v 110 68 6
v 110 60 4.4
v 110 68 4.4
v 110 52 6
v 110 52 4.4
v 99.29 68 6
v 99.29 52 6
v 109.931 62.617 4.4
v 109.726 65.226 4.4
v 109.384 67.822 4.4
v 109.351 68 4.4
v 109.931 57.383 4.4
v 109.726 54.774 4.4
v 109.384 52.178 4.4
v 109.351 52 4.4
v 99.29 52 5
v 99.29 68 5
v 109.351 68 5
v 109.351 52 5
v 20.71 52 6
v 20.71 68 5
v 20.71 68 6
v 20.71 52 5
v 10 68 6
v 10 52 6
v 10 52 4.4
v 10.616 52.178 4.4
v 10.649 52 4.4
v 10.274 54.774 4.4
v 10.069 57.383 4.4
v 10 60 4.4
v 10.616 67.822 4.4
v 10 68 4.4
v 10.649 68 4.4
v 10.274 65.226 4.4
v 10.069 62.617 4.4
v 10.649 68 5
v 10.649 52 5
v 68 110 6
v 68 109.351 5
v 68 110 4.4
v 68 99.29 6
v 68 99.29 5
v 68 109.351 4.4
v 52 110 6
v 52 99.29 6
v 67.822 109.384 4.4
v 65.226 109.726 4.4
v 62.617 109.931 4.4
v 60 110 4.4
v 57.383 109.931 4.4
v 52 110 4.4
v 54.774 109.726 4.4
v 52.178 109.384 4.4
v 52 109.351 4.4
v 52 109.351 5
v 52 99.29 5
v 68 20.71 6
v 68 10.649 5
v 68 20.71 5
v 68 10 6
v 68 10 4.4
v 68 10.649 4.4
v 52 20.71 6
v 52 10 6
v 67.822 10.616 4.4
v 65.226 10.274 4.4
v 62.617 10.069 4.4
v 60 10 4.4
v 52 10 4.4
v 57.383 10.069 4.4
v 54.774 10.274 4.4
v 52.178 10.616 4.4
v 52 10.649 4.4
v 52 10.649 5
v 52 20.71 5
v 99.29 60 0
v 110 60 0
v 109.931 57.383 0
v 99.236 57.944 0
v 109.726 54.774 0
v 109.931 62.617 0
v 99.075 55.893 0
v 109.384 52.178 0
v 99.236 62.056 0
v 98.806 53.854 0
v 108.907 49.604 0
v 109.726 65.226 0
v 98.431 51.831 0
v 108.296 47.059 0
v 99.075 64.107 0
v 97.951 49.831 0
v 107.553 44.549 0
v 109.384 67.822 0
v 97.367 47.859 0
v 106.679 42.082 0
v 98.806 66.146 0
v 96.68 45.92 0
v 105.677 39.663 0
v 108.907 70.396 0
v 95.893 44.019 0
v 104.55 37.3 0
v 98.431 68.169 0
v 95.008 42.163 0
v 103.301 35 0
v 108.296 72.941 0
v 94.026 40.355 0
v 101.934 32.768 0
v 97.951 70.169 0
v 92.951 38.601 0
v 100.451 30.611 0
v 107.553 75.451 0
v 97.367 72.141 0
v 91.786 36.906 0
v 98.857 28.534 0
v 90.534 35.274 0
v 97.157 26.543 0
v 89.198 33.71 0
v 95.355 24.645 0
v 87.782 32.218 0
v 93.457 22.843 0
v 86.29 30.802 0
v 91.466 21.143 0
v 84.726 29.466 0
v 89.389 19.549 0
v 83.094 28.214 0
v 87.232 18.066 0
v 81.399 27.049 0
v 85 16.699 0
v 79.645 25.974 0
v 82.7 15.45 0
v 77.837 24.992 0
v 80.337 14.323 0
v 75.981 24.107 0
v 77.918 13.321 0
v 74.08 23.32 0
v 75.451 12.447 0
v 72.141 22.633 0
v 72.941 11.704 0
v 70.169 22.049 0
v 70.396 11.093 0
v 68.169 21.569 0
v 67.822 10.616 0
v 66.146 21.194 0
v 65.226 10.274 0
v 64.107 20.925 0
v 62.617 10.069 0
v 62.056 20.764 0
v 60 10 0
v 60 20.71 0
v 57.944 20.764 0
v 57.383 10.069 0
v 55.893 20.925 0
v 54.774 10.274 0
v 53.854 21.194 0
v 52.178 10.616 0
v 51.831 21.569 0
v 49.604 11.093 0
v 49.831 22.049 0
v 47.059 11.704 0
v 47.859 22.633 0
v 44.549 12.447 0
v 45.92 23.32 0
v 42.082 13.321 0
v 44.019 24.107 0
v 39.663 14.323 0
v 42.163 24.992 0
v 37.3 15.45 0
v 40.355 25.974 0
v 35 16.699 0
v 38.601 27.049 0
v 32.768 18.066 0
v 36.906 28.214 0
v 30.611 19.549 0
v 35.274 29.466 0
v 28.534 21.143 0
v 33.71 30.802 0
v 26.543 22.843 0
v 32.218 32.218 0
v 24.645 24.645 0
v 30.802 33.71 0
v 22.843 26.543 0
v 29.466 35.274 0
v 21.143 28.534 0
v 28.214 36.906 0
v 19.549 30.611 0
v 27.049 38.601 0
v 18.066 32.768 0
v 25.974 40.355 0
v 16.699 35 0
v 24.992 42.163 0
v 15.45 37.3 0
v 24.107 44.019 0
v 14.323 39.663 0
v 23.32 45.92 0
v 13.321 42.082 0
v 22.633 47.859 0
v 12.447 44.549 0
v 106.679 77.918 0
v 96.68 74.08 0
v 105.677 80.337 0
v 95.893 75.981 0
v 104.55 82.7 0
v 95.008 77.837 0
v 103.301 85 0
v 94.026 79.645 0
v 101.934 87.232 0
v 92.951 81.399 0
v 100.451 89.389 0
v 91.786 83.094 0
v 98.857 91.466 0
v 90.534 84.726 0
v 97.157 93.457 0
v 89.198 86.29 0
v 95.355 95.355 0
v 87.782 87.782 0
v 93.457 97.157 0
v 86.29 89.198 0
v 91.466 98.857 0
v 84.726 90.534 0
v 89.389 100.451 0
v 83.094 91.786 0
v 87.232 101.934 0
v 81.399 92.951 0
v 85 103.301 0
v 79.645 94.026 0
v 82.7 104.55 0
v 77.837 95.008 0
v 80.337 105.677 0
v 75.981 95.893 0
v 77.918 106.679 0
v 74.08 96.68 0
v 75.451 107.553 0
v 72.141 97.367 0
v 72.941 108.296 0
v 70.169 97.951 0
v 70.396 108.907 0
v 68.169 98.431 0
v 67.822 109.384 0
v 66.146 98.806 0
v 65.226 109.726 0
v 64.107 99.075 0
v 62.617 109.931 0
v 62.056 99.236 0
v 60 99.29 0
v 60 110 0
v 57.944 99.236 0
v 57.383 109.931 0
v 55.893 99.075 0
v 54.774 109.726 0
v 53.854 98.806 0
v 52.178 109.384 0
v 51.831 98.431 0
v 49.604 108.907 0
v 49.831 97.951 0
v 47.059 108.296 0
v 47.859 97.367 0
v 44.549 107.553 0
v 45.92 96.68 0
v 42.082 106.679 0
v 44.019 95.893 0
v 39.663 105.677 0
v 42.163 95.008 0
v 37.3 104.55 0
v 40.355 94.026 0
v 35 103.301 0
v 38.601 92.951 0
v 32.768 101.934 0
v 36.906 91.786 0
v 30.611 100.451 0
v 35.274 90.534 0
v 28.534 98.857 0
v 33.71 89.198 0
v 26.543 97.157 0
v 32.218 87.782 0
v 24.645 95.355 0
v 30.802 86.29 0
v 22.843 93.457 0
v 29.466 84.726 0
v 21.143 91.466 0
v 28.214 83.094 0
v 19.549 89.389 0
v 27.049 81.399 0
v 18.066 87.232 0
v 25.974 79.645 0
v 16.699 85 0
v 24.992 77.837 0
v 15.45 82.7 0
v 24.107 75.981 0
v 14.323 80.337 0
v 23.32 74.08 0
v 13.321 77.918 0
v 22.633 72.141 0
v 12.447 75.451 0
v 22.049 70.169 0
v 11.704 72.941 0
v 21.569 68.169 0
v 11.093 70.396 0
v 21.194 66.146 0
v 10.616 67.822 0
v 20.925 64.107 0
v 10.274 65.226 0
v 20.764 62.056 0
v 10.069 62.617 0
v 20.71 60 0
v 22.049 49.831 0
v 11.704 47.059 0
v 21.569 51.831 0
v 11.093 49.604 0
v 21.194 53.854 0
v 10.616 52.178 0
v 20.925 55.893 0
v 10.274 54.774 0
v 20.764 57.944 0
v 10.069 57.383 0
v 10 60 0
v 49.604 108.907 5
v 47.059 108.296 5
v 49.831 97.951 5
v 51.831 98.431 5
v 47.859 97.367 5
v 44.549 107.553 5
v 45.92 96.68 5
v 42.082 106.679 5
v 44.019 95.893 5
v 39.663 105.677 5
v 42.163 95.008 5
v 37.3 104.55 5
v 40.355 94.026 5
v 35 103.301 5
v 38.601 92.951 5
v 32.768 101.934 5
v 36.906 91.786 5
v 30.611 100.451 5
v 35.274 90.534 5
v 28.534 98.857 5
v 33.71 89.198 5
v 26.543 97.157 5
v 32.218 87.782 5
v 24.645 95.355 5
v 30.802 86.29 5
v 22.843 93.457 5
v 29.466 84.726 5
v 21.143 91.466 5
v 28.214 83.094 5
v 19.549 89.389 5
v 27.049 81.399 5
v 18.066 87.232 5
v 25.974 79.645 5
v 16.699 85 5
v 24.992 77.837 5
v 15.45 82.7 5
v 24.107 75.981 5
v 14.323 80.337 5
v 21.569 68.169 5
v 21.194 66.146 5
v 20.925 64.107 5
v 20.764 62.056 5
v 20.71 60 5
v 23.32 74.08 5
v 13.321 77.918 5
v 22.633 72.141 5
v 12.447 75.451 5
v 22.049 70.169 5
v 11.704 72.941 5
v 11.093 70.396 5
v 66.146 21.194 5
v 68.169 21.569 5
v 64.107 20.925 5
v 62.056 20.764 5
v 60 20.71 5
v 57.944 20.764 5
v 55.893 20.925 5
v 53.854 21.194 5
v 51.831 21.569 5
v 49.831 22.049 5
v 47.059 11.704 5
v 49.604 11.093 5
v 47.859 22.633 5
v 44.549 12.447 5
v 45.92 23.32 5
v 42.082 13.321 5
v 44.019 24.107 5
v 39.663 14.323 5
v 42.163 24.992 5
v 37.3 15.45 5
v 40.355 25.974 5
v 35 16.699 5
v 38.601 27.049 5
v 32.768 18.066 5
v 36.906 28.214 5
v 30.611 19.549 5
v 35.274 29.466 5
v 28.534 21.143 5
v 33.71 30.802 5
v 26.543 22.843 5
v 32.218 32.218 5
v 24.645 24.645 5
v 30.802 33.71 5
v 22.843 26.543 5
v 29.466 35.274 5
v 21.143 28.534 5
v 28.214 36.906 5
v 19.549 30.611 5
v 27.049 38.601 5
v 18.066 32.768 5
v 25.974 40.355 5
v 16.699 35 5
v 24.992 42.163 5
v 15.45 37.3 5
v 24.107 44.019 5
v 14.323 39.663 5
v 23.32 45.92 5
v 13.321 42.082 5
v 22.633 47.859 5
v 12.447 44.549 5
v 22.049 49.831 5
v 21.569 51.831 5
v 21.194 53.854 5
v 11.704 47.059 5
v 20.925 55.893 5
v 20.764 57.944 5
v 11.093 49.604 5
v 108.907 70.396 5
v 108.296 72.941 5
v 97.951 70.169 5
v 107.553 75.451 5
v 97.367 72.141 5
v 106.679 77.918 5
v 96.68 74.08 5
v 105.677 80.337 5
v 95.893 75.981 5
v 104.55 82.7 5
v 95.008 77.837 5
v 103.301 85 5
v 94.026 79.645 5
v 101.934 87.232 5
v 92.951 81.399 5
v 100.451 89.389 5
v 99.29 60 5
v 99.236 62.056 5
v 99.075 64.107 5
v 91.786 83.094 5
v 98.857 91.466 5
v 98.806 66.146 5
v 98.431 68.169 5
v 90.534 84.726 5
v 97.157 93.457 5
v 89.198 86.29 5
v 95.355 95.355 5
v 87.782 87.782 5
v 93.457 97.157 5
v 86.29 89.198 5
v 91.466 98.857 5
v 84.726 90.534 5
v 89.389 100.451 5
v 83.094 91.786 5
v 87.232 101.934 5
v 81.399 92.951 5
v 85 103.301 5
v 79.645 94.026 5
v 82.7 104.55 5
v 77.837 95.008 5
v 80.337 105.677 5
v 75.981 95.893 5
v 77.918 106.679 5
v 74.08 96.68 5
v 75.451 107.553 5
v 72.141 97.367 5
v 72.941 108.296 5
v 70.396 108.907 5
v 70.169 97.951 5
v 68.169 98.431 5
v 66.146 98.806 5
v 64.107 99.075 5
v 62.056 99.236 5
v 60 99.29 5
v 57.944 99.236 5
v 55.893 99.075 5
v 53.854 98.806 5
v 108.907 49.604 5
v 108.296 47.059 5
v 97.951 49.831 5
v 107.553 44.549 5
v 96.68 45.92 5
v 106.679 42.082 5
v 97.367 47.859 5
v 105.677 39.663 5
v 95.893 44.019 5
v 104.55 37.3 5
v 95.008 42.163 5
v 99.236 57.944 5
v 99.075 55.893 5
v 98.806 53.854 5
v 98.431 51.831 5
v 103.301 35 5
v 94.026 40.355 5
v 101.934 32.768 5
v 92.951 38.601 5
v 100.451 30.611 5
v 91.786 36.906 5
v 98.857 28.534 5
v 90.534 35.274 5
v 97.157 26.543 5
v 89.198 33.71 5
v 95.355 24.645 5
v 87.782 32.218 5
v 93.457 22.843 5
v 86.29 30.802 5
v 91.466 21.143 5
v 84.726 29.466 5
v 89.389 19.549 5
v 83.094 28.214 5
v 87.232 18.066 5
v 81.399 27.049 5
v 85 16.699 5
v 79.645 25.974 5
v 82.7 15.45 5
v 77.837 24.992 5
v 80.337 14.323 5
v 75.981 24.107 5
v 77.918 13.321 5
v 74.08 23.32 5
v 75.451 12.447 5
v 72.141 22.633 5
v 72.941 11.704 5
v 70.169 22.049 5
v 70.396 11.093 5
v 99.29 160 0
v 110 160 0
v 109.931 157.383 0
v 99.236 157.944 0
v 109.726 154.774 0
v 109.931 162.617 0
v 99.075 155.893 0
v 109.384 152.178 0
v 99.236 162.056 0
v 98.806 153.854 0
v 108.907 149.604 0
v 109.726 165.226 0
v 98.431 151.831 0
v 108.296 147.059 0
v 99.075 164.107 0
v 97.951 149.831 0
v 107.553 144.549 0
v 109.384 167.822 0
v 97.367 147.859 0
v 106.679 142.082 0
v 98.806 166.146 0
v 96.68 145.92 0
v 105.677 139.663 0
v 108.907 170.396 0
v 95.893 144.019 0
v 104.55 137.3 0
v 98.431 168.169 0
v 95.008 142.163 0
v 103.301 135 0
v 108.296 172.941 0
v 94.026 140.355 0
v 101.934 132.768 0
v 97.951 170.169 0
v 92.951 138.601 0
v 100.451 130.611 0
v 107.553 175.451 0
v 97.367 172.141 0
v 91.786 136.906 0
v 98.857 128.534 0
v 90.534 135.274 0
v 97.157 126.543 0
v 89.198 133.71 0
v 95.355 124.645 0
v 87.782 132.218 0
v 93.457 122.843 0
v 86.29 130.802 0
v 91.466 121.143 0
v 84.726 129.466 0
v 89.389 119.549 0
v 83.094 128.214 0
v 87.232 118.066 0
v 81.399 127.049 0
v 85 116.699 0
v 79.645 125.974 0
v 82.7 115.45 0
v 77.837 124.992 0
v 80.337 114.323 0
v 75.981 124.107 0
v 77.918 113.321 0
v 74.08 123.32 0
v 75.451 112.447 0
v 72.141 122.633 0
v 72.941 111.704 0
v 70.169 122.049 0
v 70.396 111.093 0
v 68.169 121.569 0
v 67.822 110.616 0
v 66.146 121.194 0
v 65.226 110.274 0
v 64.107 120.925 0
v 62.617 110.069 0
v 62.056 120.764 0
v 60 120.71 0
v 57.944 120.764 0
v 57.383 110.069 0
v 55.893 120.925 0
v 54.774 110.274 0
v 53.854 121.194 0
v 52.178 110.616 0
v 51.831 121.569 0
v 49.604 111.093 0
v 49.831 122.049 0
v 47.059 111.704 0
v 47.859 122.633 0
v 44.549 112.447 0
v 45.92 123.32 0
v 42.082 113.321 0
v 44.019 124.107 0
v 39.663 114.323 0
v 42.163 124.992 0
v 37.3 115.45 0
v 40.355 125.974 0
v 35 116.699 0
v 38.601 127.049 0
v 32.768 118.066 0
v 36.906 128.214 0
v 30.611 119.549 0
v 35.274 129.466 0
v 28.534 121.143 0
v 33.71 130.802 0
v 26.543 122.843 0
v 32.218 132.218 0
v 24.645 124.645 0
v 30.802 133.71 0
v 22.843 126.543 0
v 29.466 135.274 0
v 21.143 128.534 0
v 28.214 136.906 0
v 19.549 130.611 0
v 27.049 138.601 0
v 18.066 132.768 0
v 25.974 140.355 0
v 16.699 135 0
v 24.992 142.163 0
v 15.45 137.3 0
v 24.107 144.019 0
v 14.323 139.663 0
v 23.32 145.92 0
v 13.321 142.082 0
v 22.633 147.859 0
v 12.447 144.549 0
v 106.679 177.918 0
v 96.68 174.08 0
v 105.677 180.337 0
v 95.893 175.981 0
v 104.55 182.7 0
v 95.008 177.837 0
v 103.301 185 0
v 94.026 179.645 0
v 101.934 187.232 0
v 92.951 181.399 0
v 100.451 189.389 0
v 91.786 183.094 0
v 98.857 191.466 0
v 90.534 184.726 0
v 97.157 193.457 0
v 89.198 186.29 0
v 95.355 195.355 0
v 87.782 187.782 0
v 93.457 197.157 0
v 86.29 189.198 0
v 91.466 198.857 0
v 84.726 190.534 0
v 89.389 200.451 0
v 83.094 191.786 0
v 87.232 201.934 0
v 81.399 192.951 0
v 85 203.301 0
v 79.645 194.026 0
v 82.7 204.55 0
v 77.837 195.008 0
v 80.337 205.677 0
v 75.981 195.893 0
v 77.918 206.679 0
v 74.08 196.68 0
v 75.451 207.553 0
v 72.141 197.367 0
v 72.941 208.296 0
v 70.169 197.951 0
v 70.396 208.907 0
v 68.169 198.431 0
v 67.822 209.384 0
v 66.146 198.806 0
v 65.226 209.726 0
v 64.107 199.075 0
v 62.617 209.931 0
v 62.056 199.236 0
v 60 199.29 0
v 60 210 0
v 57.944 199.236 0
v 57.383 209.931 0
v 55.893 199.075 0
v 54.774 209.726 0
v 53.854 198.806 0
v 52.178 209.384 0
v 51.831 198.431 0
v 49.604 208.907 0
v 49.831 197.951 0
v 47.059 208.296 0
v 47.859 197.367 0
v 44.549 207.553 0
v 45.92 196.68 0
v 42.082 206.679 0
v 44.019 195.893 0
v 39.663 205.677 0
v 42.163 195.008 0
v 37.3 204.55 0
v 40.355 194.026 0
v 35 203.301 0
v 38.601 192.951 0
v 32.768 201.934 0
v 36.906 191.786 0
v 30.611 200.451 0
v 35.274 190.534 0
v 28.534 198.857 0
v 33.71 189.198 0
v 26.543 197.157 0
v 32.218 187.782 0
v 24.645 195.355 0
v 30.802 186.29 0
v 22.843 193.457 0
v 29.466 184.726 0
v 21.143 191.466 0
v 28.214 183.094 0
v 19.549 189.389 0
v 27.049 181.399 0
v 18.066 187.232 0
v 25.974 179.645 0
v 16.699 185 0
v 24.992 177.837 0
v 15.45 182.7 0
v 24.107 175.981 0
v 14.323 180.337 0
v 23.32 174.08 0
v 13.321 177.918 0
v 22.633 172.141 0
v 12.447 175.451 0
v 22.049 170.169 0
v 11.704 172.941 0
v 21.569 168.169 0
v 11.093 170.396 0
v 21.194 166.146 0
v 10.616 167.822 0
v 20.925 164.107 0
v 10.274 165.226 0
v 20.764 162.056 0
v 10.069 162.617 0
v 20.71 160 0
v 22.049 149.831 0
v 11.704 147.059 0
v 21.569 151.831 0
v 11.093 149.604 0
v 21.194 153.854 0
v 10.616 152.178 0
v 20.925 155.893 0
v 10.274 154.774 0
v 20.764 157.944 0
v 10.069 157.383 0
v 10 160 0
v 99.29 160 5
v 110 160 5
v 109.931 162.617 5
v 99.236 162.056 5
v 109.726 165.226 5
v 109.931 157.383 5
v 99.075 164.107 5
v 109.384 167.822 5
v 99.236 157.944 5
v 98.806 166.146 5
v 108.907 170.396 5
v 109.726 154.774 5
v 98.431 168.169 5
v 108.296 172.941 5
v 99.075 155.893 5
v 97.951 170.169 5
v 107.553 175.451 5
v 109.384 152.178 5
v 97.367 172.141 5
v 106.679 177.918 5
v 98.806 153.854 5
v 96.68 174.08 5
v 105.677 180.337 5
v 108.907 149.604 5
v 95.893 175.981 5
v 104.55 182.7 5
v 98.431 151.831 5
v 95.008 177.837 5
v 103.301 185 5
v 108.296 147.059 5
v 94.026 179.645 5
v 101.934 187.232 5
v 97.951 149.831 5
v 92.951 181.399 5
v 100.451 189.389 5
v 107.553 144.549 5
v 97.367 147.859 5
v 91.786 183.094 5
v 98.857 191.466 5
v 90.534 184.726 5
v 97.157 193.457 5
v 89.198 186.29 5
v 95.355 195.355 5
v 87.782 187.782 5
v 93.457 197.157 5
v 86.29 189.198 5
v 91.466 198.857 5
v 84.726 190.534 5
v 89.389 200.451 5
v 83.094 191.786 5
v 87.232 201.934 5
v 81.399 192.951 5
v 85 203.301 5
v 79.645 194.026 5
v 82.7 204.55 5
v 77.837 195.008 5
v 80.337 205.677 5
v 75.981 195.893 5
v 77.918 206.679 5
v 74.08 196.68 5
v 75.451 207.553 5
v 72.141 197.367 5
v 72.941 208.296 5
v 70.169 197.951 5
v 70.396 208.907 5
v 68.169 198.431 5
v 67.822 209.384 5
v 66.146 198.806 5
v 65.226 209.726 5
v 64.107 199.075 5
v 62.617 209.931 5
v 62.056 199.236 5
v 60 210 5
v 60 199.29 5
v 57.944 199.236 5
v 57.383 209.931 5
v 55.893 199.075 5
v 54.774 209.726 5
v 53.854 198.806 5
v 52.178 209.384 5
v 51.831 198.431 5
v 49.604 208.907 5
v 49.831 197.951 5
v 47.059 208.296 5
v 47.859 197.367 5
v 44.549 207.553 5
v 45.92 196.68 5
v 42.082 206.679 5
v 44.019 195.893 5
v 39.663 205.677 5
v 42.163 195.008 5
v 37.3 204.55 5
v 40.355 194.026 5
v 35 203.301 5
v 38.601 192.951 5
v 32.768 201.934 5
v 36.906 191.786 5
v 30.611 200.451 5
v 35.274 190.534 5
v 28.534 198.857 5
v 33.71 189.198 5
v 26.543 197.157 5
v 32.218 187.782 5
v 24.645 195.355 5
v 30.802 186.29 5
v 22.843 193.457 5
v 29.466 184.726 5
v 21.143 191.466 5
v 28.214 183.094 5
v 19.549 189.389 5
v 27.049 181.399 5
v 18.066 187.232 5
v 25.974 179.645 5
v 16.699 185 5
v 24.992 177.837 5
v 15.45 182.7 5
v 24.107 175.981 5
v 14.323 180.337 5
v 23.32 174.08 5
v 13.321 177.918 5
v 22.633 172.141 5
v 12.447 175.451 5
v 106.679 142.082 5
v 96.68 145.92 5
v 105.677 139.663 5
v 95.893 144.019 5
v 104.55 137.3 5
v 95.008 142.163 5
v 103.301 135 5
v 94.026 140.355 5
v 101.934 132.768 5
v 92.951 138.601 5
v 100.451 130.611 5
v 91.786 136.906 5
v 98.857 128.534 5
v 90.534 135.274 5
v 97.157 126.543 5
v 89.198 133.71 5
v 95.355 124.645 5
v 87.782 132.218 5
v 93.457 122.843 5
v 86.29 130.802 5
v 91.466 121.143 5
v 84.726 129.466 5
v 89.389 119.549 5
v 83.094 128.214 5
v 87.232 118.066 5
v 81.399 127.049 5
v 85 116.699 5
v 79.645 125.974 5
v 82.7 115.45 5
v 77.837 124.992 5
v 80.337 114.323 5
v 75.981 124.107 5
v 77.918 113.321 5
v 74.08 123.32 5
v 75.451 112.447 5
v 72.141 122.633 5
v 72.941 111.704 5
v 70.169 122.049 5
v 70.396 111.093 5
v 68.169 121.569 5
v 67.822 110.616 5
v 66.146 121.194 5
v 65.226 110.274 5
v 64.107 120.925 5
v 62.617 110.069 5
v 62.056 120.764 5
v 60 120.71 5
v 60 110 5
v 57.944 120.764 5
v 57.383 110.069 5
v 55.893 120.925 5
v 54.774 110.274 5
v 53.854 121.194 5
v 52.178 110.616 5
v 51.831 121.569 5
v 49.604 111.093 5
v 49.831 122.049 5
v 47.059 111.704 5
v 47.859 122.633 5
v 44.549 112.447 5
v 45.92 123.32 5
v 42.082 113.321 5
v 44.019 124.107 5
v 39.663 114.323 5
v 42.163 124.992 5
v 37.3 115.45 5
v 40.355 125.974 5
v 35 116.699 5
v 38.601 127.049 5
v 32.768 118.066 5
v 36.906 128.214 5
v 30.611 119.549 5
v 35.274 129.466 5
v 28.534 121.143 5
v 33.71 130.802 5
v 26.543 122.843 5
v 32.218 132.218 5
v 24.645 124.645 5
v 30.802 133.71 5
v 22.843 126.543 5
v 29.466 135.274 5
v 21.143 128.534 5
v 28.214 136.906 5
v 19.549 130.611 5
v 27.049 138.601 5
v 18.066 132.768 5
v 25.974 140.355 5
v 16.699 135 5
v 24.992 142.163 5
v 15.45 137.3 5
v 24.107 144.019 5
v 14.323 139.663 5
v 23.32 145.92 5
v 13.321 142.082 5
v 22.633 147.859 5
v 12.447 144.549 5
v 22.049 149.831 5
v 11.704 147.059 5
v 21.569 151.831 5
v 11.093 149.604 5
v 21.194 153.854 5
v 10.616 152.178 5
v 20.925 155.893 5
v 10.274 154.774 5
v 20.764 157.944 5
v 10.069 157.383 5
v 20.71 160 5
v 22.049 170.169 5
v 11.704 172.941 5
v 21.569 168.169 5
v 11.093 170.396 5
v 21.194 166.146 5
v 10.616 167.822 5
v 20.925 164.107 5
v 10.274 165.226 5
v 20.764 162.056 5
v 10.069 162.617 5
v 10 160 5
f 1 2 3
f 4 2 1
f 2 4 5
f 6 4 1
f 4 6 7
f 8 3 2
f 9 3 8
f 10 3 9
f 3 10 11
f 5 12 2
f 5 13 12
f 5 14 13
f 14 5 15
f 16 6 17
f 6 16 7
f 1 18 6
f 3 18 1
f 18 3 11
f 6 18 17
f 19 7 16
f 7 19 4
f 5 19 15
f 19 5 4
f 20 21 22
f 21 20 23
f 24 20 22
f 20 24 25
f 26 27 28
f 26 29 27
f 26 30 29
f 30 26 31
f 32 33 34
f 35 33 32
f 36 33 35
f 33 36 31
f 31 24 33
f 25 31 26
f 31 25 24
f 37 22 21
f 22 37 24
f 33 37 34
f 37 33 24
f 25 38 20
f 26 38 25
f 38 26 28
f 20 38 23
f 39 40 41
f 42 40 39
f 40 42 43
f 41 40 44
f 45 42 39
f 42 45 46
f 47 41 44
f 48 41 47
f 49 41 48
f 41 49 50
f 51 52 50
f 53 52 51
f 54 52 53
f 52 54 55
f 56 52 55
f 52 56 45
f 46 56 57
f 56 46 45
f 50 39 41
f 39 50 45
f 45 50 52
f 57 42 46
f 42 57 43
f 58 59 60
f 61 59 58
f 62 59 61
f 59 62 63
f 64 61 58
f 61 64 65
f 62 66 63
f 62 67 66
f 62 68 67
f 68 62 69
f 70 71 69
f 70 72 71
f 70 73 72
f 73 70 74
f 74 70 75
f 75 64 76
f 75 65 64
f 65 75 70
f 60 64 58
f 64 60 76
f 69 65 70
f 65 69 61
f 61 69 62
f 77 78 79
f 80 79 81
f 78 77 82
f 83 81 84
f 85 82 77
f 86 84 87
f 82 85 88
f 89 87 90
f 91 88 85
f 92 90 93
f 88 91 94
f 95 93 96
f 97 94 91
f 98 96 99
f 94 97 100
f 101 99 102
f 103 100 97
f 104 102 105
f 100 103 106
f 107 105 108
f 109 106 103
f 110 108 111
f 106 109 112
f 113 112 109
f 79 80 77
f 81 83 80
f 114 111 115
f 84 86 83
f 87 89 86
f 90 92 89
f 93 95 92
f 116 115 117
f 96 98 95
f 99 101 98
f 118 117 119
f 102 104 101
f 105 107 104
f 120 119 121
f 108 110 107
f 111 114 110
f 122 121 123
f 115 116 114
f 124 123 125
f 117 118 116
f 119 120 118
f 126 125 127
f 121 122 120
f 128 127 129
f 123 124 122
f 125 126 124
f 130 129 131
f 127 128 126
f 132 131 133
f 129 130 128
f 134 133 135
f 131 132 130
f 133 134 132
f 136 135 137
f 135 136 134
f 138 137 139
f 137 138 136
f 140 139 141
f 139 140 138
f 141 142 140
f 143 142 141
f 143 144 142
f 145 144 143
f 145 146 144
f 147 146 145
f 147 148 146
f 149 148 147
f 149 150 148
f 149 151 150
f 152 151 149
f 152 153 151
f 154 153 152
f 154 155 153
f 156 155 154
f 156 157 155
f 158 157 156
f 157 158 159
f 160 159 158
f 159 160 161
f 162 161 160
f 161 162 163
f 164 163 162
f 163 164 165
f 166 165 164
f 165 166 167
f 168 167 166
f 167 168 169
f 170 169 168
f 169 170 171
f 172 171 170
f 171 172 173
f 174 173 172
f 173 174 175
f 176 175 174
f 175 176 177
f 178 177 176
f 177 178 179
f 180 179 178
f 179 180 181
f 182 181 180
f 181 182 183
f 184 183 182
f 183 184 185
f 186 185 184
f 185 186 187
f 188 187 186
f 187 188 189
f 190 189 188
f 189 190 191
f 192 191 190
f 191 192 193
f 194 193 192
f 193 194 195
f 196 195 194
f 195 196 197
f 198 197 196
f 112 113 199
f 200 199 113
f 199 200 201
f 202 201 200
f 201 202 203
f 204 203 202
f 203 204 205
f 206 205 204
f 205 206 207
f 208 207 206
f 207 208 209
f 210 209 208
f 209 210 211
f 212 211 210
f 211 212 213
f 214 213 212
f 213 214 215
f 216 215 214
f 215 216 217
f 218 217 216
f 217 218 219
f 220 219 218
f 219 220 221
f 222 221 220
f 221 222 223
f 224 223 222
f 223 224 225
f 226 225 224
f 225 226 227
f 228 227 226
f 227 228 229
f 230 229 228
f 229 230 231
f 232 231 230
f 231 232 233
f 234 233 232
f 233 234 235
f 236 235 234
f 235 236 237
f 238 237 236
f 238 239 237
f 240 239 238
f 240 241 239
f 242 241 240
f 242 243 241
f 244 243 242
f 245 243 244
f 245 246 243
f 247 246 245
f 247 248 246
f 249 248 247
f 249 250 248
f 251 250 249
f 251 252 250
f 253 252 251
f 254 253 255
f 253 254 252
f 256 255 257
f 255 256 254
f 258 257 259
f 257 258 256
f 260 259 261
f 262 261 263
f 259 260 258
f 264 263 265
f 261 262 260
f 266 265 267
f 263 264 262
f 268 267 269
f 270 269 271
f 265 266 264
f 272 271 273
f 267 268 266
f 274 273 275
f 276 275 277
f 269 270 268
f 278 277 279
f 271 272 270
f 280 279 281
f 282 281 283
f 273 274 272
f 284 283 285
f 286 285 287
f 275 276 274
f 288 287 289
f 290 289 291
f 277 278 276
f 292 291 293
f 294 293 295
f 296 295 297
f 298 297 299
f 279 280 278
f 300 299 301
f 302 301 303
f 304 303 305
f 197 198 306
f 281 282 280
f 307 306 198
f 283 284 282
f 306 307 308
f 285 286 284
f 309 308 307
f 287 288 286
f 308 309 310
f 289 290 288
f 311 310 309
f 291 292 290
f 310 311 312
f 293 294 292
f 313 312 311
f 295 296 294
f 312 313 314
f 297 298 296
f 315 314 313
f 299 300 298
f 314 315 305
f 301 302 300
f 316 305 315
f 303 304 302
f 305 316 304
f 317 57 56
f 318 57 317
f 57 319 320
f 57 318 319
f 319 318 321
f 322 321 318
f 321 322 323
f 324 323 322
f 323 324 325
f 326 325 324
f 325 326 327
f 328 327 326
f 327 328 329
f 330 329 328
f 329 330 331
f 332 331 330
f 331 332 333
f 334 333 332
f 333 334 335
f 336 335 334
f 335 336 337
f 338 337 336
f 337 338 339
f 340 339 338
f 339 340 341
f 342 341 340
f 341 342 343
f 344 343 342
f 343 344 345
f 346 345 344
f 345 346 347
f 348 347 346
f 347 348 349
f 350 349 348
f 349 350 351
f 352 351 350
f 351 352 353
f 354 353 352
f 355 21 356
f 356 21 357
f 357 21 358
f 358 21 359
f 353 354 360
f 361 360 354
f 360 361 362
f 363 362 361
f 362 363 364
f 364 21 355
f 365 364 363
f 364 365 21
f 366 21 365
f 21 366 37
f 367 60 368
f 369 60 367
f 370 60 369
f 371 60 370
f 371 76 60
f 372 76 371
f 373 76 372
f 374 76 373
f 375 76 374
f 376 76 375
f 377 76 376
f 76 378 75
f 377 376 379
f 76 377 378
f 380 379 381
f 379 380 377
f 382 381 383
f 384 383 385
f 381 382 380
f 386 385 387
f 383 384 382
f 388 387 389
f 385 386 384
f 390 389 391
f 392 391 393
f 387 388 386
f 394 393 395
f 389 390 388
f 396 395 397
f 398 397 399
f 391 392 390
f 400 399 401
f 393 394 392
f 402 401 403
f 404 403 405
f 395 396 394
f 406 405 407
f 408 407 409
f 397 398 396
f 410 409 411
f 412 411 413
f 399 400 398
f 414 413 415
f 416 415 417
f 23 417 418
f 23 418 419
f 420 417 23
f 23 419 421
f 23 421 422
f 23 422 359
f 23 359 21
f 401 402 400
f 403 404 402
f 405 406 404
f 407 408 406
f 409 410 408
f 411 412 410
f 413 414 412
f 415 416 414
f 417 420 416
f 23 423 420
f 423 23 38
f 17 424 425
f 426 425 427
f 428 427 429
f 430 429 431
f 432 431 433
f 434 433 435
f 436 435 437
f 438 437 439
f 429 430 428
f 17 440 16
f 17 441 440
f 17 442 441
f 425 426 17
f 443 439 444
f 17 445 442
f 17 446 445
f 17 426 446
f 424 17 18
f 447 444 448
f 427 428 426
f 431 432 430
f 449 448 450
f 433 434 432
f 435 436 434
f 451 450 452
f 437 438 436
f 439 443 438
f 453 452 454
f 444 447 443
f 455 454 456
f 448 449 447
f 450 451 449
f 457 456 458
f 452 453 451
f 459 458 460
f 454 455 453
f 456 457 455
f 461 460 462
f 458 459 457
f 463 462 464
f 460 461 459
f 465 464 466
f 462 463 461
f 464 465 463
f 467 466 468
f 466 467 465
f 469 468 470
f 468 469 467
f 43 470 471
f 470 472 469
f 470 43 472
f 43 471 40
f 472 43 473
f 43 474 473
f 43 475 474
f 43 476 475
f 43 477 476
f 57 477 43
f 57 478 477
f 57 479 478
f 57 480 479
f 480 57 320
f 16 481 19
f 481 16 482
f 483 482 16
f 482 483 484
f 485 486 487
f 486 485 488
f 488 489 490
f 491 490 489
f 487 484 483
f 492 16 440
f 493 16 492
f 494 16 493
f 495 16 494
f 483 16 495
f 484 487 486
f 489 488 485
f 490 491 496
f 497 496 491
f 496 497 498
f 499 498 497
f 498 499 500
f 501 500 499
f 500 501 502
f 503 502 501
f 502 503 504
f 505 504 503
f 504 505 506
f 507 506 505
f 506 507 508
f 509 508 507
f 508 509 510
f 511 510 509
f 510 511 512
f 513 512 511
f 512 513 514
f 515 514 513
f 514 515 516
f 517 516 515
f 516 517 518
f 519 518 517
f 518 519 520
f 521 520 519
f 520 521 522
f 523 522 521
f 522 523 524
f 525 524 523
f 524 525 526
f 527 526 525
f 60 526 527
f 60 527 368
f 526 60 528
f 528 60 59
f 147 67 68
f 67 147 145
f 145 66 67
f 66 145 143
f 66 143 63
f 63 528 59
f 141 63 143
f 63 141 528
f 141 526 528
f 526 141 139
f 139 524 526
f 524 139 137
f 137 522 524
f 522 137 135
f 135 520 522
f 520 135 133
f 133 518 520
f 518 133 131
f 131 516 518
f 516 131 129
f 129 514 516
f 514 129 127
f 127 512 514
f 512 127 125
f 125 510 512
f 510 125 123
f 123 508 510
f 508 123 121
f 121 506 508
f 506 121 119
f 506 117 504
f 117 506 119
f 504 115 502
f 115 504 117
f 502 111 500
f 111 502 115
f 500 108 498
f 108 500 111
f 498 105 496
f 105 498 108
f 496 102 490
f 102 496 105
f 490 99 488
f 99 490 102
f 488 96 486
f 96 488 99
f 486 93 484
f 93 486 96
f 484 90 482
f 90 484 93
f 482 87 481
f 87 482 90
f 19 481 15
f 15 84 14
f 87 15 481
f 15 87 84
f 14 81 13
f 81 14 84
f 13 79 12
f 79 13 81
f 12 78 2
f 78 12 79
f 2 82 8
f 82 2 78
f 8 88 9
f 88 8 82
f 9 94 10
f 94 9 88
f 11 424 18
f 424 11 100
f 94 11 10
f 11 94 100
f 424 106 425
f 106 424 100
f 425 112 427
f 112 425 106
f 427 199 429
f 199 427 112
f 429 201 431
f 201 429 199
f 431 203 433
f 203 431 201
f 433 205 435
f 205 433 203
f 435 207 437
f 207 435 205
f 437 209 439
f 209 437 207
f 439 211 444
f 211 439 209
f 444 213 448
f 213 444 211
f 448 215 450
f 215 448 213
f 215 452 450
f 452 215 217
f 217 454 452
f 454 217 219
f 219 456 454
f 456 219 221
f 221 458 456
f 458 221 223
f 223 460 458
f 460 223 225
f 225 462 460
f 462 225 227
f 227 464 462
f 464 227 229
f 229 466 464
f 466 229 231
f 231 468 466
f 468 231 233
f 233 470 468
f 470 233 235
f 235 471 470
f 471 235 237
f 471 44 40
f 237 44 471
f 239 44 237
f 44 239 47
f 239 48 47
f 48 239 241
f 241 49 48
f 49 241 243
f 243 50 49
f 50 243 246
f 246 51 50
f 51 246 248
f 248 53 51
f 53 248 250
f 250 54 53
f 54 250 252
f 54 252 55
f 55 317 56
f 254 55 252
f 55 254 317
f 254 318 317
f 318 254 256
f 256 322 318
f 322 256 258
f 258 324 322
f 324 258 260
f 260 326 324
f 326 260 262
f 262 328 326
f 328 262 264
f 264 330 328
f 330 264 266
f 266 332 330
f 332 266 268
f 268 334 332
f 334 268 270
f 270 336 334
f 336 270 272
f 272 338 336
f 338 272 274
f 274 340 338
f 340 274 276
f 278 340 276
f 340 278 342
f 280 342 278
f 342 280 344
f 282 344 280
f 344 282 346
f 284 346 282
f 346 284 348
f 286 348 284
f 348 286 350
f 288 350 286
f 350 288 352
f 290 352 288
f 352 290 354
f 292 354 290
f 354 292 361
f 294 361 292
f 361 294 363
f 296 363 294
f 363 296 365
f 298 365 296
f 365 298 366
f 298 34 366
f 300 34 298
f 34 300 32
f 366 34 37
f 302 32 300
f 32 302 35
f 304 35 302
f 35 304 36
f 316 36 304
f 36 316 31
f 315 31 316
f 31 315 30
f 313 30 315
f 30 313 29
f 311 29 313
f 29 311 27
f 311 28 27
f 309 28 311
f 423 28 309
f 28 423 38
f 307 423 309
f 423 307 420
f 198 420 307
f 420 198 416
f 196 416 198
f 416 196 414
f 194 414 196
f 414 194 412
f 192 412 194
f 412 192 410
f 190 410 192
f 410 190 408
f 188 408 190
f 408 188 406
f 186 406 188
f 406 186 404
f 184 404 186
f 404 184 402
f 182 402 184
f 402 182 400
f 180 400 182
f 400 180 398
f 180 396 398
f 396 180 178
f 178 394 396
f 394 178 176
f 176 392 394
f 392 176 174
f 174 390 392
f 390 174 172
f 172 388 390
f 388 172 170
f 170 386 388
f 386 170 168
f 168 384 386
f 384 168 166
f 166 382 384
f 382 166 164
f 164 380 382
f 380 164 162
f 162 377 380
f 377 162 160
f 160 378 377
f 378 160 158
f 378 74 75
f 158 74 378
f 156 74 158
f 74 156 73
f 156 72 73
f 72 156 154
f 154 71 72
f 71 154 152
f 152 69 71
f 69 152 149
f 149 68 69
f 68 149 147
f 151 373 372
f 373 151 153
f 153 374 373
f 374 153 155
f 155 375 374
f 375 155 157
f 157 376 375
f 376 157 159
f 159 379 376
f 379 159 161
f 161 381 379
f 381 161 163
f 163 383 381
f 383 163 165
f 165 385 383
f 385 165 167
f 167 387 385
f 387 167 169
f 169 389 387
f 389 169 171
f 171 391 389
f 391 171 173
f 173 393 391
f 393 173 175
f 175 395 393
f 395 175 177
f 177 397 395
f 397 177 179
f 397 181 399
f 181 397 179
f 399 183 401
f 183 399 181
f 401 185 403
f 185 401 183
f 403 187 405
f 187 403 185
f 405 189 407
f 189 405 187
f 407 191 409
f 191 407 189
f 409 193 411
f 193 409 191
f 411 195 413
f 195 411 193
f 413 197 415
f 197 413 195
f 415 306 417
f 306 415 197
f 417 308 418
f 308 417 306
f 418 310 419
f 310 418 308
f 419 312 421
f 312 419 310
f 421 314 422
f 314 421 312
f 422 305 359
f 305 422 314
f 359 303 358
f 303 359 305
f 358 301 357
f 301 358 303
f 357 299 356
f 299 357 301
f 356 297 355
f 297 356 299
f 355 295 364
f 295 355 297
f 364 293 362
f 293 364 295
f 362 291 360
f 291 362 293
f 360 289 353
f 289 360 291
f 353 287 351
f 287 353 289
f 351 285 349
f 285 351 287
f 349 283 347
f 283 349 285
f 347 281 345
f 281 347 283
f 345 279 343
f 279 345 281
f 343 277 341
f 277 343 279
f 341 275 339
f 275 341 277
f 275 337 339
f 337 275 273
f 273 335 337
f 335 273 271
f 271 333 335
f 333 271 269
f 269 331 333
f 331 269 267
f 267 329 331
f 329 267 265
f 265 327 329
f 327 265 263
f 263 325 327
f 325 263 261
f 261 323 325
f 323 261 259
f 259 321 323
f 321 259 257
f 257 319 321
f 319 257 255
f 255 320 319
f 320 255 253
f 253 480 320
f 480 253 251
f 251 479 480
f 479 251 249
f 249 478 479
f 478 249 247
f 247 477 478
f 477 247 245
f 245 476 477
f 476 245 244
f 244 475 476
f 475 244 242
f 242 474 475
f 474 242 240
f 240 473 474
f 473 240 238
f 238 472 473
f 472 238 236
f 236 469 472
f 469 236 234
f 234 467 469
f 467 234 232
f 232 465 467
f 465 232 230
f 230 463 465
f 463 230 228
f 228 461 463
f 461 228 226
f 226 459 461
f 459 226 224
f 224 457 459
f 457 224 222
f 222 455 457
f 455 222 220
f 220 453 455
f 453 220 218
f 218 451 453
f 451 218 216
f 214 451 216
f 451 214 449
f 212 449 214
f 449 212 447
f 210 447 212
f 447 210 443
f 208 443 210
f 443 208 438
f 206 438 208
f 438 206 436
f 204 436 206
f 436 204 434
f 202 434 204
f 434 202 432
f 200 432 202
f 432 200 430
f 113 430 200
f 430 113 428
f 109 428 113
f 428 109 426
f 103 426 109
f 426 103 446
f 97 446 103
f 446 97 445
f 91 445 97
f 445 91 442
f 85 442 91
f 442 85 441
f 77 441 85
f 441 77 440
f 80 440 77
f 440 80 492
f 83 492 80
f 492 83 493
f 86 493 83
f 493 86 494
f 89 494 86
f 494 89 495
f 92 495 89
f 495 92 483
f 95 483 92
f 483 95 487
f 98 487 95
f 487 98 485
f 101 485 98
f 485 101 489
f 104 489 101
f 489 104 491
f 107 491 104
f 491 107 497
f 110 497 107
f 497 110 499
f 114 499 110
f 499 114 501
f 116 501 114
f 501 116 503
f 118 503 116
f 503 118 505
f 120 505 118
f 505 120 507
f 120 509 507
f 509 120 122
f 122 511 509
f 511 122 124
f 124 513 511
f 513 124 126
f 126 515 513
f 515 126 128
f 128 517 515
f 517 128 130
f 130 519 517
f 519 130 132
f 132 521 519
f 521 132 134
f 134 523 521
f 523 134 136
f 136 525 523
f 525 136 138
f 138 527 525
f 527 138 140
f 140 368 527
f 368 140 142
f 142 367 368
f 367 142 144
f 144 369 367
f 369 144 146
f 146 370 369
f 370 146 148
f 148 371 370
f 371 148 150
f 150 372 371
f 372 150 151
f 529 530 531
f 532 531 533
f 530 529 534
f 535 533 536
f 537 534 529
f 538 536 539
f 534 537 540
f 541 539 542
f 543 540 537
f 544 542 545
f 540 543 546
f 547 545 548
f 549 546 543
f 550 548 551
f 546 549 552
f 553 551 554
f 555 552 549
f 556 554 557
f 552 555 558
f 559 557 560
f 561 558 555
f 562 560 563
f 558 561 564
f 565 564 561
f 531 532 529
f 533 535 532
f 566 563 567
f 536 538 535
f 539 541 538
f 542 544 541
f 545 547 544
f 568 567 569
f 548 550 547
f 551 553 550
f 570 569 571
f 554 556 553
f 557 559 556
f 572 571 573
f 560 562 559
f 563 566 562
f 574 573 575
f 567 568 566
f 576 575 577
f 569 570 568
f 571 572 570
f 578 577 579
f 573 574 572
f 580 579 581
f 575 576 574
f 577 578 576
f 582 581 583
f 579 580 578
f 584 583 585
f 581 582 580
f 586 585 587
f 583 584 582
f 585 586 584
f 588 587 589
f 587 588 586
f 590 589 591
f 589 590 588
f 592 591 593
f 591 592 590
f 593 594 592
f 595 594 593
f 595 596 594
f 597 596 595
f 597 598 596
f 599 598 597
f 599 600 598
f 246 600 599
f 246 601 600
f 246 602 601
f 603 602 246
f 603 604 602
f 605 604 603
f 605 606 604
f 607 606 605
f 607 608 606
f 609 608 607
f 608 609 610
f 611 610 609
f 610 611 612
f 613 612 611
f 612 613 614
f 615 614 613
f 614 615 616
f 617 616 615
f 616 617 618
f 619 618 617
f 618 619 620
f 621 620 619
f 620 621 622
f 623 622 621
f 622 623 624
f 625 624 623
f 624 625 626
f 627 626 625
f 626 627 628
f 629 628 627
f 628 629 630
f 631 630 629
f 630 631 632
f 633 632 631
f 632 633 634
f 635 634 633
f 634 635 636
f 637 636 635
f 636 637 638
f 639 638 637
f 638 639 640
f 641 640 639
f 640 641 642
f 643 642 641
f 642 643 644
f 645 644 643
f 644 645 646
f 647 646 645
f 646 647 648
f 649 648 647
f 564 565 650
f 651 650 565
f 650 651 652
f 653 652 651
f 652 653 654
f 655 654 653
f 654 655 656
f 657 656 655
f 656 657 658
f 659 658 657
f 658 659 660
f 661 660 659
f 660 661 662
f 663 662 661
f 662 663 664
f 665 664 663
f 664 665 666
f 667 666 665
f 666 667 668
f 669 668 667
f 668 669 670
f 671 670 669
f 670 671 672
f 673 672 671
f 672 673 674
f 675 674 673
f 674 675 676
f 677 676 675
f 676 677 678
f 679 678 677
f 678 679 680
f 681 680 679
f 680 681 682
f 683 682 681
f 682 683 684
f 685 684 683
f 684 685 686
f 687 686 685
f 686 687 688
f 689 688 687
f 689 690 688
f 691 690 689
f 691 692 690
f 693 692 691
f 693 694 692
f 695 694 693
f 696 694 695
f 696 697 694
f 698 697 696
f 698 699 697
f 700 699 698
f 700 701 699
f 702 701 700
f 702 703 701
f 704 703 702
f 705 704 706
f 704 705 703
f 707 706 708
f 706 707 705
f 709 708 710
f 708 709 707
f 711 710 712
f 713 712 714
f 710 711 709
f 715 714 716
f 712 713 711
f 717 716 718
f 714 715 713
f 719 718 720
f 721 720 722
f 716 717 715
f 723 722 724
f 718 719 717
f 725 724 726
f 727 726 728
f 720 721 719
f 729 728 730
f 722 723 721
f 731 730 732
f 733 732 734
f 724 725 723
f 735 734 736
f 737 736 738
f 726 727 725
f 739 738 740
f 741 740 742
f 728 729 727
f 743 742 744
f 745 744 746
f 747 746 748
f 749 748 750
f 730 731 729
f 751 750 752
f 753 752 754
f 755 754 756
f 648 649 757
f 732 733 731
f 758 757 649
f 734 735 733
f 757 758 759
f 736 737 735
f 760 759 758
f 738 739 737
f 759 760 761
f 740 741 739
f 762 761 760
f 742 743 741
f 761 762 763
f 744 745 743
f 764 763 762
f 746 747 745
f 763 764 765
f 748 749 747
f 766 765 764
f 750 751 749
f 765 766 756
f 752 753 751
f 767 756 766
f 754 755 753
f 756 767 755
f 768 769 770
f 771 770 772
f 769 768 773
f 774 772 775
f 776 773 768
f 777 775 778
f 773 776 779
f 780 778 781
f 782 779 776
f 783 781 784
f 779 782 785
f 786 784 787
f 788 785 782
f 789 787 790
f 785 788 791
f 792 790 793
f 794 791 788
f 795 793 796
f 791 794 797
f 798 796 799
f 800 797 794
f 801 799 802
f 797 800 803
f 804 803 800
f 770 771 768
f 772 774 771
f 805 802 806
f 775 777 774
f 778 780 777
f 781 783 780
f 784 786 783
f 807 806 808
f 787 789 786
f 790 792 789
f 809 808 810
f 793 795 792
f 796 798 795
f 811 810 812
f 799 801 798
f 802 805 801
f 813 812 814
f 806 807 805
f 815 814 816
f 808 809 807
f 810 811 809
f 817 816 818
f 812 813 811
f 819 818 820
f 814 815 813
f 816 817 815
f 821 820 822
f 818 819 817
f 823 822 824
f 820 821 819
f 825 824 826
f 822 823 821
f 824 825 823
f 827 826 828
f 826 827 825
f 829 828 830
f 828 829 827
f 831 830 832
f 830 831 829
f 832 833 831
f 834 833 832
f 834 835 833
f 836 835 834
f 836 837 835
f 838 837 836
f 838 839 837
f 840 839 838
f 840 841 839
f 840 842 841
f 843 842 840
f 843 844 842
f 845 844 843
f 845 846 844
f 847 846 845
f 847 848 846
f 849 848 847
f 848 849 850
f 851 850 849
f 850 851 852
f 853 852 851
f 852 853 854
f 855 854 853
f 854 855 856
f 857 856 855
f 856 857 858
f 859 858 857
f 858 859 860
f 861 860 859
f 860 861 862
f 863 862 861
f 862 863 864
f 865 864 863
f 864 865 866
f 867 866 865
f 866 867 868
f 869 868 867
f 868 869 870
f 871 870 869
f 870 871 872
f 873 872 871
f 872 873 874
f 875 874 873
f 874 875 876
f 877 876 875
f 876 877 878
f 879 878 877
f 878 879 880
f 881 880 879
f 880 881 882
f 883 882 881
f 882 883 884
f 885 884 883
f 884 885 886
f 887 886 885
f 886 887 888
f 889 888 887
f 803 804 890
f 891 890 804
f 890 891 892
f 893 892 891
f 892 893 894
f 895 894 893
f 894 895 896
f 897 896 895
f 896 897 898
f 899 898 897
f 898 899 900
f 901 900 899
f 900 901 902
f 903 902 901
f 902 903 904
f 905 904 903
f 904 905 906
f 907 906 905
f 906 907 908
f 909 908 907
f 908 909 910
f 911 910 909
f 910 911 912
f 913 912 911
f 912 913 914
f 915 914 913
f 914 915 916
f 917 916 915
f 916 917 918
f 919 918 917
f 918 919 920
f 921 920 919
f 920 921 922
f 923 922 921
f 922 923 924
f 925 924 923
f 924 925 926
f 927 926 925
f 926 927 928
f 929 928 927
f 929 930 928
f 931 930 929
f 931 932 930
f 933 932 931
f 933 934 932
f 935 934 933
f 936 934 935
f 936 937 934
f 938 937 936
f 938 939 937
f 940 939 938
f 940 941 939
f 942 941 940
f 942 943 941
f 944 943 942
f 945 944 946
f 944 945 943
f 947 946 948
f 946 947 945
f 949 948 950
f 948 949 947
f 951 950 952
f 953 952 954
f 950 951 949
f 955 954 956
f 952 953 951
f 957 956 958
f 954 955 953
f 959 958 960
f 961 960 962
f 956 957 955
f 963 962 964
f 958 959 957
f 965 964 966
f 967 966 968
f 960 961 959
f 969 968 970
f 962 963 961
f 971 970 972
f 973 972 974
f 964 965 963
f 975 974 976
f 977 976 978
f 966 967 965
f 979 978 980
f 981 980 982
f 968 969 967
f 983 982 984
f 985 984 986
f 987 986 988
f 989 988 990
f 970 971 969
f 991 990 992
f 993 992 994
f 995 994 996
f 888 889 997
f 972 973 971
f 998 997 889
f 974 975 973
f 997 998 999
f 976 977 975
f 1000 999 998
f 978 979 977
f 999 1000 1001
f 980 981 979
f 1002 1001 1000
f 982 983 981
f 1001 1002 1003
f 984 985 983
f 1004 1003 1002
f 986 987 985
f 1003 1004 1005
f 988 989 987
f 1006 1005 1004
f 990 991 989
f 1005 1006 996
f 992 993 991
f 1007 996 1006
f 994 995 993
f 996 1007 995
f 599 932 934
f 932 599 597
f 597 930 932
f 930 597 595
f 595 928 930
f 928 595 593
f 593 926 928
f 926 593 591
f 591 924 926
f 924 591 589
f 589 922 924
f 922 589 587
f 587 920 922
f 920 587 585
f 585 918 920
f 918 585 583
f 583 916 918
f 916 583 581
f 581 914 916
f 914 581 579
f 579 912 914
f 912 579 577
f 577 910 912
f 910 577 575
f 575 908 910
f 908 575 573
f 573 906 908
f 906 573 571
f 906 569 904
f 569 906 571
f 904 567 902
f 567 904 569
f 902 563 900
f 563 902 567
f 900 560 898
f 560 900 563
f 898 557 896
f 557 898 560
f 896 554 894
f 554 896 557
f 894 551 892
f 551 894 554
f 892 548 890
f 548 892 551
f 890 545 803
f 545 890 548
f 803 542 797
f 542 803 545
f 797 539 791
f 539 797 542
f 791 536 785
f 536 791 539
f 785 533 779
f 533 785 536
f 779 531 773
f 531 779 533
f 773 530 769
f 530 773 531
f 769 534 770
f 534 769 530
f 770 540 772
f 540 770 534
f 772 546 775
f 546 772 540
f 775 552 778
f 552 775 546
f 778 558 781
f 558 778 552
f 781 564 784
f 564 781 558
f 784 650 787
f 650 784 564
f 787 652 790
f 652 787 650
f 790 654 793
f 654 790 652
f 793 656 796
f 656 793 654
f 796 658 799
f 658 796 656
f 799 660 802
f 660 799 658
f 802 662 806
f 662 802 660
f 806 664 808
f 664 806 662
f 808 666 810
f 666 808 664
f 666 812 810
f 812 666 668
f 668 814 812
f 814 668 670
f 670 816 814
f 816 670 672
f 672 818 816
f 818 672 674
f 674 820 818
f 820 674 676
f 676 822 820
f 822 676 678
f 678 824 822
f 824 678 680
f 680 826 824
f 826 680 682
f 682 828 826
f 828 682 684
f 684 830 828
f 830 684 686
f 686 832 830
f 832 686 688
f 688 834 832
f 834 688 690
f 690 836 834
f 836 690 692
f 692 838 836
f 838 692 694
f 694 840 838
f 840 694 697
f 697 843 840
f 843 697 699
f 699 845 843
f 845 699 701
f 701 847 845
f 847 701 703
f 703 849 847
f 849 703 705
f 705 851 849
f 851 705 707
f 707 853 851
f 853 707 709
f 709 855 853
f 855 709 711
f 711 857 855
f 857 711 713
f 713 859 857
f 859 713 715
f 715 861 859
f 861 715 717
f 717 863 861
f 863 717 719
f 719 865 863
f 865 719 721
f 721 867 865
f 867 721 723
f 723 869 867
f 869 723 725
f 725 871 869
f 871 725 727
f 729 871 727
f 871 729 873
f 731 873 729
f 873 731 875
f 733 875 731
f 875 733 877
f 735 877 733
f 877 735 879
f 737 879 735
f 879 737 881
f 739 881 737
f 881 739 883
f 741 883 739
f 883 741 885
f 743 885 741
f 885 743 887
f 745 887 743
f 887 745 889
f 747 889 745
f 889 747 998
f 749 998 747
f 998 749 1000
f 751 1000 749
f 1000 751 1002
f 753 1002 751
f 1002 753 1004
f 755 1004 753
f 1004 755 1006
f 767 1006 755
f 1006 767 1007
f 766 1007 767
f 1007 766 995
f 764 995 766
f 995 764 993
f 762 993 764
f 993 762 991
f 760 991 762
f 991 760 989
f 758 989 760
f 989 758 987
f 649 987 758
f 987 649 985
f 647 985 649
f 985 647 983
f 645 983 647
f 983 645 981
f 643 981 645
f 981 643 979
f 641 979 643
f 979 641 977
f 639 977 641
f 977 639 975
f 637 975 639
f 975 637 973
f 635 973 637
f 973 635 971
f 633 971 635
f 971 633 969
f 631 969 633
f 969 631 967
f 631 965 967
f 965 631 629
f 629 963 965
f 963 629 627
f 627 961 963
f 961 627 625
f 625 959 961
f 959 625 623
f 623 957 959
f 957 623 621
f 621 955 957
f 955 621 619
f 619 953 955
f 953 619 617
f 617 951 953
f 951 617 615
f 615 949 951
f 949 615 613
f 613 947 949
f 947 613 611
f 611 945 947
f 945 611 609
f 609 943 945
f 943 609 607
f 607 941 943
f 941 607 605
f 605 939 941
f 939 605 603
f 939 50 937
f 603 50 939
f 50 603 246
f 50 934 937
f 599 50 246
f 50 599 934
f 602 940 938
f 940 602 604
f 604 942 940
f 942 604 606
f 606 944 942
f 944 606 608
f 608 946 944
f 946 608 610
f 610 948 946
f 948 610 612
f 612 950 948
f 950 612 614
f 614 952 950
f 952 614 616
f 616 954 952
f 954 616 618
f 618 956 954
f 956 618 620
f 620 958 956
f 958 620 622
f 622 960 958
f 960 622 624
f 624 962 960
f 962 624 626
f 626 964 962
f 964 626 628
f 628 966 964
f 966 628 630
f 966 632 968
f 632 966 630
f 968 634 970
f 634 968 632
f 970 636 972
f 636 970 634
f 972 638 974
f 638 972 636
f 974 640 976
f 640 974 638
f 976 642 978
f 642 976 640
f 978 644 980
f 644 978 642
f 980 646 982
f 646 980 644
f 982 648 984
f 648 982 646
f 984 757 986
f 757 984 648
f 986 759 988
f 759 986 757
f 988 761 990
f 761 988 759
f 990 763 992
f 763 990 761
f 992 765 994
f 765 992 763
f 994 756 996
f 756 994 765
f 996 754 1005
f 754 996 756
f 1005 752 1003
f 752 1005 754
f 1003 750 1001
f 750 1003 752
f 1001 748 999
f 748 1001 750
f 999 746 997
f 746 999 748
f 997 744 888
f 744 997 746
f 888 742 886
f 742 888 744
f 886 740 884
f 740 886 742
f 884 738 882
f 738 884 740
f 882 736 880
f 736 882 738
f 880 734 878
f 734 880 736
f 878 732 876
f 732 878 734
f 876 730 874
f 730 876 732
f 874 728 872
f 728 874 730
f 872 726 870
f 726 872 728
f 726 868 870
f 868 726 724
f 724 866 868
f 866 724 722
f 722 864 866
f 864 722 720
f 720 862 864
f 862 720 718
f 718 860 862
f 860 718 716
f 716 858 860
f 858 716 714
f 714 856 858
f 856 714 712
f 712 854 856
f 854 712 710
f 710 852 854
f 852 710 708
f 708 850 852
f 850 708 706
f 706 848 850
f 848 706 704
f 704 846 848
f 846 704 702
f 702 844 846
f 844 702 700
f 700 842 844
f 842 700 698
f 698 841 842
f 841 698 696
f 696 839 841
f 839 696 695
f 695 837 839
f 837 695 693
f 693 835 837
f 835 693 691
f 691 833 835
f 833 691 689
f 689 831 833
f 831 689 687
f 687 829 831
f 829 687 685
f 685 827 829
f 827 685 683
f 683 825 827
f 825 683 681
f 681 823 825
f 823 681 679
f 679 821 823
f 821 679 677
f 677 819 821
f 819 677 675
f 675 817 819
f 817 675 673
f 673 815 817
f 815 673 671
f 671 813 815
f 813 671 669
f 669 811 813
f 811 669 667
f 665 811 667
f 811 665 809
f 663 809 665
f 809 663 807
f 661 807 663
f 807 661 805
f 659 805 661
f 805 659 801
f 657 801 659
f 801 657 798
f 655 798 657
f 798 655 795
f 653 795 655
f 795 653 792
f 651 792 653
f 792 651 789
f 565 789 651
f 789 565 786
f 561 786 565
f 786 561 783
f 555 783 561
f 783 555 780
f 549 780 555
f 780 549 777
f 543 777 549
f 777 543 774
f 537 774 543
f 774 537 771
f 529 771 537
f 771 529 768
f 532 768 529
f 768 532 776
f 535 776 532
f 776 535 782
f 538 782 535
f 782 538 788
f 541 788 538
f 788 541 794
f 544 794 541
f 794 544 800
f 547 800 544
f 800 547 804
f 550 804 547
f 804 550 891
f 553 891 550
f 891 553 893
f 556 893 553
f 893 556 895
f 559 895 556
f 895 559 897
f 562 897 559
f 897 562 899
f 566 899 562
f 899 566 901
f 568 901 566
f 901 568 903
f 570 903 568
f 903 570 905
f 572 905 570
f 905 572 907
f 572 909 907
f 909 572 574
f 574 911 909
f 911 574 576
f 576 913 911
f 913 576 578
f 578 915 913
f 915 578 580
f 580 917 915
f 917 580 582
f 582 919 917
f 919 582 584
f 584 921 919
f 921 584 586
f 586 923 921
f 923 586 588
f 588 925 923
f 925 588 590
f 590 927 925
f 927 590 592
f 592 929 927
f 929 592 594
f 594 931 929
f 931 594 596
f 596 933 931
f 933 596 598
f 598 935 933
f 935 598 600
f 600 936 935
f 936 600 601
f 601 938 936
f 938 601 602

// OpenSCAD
/*
 * Orbe — Estrutura de Bobinas de Helmholtz (Substrato 156 — Dipolo de Arkhe)
 * Modelo 3D parametrizado em OpenSCAD
 * Modelo: ORB-01 · Versão: v1.0 · Data: 2026-08-30
 *
 * Baseado na análise estática do G-code real (Orbe_Helmholtz.gcode)
 * e na correção de escala 50/56 centrada nos eixos das bobinas
 * (Orbe_Helmholtz_100mm_corrigido.gcode).
 *
 * Geometria:
 *   - Dois anéis coaxiais (annulus) de R_ext=50, R_int=39.29, altura 5 mm
 *   - Anel Z+ (superior): centro (X=60, Y=60)
 *   - Anel Z- (inferior): centro (X=60, Y=160)
 *   - 4 abas de ponte radiais (do bordo interno ao externo) no anel Z+
 *
 * Uso no OpenSCAD:
 *   1. Abra este arquivo.
 *   2. Ajuste os parâmetros na seção "PARÂMETROS".
 *   3. Design > Preview (F5) e Render (F6).
 *   4. Arquivo > Exportar > Export as STL.
 */
$fn = 120; // resolução angular (aumente para suavizar)

/* ================== PARÂMETROS ================== */
// --- Dimensões da estrutura ---
r_outer     = 50.0;    // raio externo do anel (mm)  [56 -> 50 corrigido]
r_inner     = 39.29;   // raio interno do anel (mm)  [44 -> ~39.29]
ring_h      = 5.0;     // altura de cada anel (mm)   [25 camadas x 0.2]
layer_h     = 0.2;     // altura de camada (referência, mm)

// --- Posições (sistema de coordenadas da mesa do G-code) ---
center_x    = 60.0;    // eixo comum das bobinas (X)
ring_zp_y   = 60.0;    // centro do anel Z+ (superior)
ring_zm_y   = 160.0;   // centro do anel Z- (inferior)
ring_z_base = 0.0;     // base dos anéis em Z (mm)

// --- Abas de ponte (suportes no anel Z+, fundidos ao topo do anel) ---
show_bridges  = true;        // mostrar as 4 abas de ponte
bridge_thick  = 1.6;         // espessura (em Z) de cada aba (mm)
bridge_half_w = 8.0;         // meia-largura tangencial de cada aba (mm)
bridge_z      = ring_h + bridge_thick / 2 - 0.6; // centro Z (overlap de 0.6 mm p/ fundir ao anel)
// O comprimento radial de cada aba vai de r_inner até r_outer (como no G-code).

// --- Modo de exibição ---
mode = "print";        // "print"  = anéis planos na mesa (como impressos)
                       // "mounted"= bobinas em pé (coils), visual conceitual

// --- Seleção de parte exportada ---
// "zp"   = somente anel Z+ (com pontes)
// "zm"   = somente anel Z-
// "both" = os dois anéis (juntos no mesmo arquivo; na impressão real os
//          dois ficam no mesmo plano e se sobrepõem em Y — consulte README)
part = "both";

/* ================== FIM DOS PARÂMETROS ================== */

/* Anel (annulus) posicionado em (x, y) */
module ring(x, y) {
    translate([x, y, ring_z_base])
        linear_extrude(height = ring_h)
            difference() {
                circle(r = r_outer);
                circle(r = r_inner);
            }
}

/* 4 abas de ponte radiais nos pontos cardeais do anel Z+ */
module bridges_zp() {
    if (show_bridges) {
        half = bridge_half_w;
        // comprimento radial do tab (do bordo interno ao externo)
        rad_len = r_outer - r_inner;
        // centro radial do tab
        rad_center = (r_inner + r_outer) / 2;

        // +X (direita)
        translate([center_x + rad_center, ring_zp_y, bridge_z])
            cube([rad_len, half * 2, bridge_thick], center = true);
        // -X (esquerda)
        translate([center_x - rad_center, ring_zp_y, bridge_z])
            cube([rad_len, half * 2, bridge_thick], center = true);
        // +Y (frente)
        translate([center_x, ring_zp_y + rad_center, bridge_z])
            cube([half * 2, rad_len, bridge_thick], center = true);
        // -Y (trás)
        translate([center_x, ring_zp_y - rad_center, bridge_z])
            cube([half * 2, rad_len, bridge_thick], center = true);
    }
}

/* ================== GERAÇÃO ================== */
module orbe_print() {
    // anel Z+ (com pontes) e anel Z-
    if (part == "zp" || part == "both") { bridges_zp(); ring(center_x, ring_zp_y); }
    if (part == "zm" || part == "both") { ring(center_x, ring_zm_y); }
}

/* Visualização conceitual "mounted": duas bobinas em pé */
module orbe_mounted() {
    rotate([0, 45, 0])
        orbe_print();
}

if (mode == "print") {
    orbe_print();
} else if (mode == "mounted") {
    orbe_mounted();
} else {
    orbe_print();
}
